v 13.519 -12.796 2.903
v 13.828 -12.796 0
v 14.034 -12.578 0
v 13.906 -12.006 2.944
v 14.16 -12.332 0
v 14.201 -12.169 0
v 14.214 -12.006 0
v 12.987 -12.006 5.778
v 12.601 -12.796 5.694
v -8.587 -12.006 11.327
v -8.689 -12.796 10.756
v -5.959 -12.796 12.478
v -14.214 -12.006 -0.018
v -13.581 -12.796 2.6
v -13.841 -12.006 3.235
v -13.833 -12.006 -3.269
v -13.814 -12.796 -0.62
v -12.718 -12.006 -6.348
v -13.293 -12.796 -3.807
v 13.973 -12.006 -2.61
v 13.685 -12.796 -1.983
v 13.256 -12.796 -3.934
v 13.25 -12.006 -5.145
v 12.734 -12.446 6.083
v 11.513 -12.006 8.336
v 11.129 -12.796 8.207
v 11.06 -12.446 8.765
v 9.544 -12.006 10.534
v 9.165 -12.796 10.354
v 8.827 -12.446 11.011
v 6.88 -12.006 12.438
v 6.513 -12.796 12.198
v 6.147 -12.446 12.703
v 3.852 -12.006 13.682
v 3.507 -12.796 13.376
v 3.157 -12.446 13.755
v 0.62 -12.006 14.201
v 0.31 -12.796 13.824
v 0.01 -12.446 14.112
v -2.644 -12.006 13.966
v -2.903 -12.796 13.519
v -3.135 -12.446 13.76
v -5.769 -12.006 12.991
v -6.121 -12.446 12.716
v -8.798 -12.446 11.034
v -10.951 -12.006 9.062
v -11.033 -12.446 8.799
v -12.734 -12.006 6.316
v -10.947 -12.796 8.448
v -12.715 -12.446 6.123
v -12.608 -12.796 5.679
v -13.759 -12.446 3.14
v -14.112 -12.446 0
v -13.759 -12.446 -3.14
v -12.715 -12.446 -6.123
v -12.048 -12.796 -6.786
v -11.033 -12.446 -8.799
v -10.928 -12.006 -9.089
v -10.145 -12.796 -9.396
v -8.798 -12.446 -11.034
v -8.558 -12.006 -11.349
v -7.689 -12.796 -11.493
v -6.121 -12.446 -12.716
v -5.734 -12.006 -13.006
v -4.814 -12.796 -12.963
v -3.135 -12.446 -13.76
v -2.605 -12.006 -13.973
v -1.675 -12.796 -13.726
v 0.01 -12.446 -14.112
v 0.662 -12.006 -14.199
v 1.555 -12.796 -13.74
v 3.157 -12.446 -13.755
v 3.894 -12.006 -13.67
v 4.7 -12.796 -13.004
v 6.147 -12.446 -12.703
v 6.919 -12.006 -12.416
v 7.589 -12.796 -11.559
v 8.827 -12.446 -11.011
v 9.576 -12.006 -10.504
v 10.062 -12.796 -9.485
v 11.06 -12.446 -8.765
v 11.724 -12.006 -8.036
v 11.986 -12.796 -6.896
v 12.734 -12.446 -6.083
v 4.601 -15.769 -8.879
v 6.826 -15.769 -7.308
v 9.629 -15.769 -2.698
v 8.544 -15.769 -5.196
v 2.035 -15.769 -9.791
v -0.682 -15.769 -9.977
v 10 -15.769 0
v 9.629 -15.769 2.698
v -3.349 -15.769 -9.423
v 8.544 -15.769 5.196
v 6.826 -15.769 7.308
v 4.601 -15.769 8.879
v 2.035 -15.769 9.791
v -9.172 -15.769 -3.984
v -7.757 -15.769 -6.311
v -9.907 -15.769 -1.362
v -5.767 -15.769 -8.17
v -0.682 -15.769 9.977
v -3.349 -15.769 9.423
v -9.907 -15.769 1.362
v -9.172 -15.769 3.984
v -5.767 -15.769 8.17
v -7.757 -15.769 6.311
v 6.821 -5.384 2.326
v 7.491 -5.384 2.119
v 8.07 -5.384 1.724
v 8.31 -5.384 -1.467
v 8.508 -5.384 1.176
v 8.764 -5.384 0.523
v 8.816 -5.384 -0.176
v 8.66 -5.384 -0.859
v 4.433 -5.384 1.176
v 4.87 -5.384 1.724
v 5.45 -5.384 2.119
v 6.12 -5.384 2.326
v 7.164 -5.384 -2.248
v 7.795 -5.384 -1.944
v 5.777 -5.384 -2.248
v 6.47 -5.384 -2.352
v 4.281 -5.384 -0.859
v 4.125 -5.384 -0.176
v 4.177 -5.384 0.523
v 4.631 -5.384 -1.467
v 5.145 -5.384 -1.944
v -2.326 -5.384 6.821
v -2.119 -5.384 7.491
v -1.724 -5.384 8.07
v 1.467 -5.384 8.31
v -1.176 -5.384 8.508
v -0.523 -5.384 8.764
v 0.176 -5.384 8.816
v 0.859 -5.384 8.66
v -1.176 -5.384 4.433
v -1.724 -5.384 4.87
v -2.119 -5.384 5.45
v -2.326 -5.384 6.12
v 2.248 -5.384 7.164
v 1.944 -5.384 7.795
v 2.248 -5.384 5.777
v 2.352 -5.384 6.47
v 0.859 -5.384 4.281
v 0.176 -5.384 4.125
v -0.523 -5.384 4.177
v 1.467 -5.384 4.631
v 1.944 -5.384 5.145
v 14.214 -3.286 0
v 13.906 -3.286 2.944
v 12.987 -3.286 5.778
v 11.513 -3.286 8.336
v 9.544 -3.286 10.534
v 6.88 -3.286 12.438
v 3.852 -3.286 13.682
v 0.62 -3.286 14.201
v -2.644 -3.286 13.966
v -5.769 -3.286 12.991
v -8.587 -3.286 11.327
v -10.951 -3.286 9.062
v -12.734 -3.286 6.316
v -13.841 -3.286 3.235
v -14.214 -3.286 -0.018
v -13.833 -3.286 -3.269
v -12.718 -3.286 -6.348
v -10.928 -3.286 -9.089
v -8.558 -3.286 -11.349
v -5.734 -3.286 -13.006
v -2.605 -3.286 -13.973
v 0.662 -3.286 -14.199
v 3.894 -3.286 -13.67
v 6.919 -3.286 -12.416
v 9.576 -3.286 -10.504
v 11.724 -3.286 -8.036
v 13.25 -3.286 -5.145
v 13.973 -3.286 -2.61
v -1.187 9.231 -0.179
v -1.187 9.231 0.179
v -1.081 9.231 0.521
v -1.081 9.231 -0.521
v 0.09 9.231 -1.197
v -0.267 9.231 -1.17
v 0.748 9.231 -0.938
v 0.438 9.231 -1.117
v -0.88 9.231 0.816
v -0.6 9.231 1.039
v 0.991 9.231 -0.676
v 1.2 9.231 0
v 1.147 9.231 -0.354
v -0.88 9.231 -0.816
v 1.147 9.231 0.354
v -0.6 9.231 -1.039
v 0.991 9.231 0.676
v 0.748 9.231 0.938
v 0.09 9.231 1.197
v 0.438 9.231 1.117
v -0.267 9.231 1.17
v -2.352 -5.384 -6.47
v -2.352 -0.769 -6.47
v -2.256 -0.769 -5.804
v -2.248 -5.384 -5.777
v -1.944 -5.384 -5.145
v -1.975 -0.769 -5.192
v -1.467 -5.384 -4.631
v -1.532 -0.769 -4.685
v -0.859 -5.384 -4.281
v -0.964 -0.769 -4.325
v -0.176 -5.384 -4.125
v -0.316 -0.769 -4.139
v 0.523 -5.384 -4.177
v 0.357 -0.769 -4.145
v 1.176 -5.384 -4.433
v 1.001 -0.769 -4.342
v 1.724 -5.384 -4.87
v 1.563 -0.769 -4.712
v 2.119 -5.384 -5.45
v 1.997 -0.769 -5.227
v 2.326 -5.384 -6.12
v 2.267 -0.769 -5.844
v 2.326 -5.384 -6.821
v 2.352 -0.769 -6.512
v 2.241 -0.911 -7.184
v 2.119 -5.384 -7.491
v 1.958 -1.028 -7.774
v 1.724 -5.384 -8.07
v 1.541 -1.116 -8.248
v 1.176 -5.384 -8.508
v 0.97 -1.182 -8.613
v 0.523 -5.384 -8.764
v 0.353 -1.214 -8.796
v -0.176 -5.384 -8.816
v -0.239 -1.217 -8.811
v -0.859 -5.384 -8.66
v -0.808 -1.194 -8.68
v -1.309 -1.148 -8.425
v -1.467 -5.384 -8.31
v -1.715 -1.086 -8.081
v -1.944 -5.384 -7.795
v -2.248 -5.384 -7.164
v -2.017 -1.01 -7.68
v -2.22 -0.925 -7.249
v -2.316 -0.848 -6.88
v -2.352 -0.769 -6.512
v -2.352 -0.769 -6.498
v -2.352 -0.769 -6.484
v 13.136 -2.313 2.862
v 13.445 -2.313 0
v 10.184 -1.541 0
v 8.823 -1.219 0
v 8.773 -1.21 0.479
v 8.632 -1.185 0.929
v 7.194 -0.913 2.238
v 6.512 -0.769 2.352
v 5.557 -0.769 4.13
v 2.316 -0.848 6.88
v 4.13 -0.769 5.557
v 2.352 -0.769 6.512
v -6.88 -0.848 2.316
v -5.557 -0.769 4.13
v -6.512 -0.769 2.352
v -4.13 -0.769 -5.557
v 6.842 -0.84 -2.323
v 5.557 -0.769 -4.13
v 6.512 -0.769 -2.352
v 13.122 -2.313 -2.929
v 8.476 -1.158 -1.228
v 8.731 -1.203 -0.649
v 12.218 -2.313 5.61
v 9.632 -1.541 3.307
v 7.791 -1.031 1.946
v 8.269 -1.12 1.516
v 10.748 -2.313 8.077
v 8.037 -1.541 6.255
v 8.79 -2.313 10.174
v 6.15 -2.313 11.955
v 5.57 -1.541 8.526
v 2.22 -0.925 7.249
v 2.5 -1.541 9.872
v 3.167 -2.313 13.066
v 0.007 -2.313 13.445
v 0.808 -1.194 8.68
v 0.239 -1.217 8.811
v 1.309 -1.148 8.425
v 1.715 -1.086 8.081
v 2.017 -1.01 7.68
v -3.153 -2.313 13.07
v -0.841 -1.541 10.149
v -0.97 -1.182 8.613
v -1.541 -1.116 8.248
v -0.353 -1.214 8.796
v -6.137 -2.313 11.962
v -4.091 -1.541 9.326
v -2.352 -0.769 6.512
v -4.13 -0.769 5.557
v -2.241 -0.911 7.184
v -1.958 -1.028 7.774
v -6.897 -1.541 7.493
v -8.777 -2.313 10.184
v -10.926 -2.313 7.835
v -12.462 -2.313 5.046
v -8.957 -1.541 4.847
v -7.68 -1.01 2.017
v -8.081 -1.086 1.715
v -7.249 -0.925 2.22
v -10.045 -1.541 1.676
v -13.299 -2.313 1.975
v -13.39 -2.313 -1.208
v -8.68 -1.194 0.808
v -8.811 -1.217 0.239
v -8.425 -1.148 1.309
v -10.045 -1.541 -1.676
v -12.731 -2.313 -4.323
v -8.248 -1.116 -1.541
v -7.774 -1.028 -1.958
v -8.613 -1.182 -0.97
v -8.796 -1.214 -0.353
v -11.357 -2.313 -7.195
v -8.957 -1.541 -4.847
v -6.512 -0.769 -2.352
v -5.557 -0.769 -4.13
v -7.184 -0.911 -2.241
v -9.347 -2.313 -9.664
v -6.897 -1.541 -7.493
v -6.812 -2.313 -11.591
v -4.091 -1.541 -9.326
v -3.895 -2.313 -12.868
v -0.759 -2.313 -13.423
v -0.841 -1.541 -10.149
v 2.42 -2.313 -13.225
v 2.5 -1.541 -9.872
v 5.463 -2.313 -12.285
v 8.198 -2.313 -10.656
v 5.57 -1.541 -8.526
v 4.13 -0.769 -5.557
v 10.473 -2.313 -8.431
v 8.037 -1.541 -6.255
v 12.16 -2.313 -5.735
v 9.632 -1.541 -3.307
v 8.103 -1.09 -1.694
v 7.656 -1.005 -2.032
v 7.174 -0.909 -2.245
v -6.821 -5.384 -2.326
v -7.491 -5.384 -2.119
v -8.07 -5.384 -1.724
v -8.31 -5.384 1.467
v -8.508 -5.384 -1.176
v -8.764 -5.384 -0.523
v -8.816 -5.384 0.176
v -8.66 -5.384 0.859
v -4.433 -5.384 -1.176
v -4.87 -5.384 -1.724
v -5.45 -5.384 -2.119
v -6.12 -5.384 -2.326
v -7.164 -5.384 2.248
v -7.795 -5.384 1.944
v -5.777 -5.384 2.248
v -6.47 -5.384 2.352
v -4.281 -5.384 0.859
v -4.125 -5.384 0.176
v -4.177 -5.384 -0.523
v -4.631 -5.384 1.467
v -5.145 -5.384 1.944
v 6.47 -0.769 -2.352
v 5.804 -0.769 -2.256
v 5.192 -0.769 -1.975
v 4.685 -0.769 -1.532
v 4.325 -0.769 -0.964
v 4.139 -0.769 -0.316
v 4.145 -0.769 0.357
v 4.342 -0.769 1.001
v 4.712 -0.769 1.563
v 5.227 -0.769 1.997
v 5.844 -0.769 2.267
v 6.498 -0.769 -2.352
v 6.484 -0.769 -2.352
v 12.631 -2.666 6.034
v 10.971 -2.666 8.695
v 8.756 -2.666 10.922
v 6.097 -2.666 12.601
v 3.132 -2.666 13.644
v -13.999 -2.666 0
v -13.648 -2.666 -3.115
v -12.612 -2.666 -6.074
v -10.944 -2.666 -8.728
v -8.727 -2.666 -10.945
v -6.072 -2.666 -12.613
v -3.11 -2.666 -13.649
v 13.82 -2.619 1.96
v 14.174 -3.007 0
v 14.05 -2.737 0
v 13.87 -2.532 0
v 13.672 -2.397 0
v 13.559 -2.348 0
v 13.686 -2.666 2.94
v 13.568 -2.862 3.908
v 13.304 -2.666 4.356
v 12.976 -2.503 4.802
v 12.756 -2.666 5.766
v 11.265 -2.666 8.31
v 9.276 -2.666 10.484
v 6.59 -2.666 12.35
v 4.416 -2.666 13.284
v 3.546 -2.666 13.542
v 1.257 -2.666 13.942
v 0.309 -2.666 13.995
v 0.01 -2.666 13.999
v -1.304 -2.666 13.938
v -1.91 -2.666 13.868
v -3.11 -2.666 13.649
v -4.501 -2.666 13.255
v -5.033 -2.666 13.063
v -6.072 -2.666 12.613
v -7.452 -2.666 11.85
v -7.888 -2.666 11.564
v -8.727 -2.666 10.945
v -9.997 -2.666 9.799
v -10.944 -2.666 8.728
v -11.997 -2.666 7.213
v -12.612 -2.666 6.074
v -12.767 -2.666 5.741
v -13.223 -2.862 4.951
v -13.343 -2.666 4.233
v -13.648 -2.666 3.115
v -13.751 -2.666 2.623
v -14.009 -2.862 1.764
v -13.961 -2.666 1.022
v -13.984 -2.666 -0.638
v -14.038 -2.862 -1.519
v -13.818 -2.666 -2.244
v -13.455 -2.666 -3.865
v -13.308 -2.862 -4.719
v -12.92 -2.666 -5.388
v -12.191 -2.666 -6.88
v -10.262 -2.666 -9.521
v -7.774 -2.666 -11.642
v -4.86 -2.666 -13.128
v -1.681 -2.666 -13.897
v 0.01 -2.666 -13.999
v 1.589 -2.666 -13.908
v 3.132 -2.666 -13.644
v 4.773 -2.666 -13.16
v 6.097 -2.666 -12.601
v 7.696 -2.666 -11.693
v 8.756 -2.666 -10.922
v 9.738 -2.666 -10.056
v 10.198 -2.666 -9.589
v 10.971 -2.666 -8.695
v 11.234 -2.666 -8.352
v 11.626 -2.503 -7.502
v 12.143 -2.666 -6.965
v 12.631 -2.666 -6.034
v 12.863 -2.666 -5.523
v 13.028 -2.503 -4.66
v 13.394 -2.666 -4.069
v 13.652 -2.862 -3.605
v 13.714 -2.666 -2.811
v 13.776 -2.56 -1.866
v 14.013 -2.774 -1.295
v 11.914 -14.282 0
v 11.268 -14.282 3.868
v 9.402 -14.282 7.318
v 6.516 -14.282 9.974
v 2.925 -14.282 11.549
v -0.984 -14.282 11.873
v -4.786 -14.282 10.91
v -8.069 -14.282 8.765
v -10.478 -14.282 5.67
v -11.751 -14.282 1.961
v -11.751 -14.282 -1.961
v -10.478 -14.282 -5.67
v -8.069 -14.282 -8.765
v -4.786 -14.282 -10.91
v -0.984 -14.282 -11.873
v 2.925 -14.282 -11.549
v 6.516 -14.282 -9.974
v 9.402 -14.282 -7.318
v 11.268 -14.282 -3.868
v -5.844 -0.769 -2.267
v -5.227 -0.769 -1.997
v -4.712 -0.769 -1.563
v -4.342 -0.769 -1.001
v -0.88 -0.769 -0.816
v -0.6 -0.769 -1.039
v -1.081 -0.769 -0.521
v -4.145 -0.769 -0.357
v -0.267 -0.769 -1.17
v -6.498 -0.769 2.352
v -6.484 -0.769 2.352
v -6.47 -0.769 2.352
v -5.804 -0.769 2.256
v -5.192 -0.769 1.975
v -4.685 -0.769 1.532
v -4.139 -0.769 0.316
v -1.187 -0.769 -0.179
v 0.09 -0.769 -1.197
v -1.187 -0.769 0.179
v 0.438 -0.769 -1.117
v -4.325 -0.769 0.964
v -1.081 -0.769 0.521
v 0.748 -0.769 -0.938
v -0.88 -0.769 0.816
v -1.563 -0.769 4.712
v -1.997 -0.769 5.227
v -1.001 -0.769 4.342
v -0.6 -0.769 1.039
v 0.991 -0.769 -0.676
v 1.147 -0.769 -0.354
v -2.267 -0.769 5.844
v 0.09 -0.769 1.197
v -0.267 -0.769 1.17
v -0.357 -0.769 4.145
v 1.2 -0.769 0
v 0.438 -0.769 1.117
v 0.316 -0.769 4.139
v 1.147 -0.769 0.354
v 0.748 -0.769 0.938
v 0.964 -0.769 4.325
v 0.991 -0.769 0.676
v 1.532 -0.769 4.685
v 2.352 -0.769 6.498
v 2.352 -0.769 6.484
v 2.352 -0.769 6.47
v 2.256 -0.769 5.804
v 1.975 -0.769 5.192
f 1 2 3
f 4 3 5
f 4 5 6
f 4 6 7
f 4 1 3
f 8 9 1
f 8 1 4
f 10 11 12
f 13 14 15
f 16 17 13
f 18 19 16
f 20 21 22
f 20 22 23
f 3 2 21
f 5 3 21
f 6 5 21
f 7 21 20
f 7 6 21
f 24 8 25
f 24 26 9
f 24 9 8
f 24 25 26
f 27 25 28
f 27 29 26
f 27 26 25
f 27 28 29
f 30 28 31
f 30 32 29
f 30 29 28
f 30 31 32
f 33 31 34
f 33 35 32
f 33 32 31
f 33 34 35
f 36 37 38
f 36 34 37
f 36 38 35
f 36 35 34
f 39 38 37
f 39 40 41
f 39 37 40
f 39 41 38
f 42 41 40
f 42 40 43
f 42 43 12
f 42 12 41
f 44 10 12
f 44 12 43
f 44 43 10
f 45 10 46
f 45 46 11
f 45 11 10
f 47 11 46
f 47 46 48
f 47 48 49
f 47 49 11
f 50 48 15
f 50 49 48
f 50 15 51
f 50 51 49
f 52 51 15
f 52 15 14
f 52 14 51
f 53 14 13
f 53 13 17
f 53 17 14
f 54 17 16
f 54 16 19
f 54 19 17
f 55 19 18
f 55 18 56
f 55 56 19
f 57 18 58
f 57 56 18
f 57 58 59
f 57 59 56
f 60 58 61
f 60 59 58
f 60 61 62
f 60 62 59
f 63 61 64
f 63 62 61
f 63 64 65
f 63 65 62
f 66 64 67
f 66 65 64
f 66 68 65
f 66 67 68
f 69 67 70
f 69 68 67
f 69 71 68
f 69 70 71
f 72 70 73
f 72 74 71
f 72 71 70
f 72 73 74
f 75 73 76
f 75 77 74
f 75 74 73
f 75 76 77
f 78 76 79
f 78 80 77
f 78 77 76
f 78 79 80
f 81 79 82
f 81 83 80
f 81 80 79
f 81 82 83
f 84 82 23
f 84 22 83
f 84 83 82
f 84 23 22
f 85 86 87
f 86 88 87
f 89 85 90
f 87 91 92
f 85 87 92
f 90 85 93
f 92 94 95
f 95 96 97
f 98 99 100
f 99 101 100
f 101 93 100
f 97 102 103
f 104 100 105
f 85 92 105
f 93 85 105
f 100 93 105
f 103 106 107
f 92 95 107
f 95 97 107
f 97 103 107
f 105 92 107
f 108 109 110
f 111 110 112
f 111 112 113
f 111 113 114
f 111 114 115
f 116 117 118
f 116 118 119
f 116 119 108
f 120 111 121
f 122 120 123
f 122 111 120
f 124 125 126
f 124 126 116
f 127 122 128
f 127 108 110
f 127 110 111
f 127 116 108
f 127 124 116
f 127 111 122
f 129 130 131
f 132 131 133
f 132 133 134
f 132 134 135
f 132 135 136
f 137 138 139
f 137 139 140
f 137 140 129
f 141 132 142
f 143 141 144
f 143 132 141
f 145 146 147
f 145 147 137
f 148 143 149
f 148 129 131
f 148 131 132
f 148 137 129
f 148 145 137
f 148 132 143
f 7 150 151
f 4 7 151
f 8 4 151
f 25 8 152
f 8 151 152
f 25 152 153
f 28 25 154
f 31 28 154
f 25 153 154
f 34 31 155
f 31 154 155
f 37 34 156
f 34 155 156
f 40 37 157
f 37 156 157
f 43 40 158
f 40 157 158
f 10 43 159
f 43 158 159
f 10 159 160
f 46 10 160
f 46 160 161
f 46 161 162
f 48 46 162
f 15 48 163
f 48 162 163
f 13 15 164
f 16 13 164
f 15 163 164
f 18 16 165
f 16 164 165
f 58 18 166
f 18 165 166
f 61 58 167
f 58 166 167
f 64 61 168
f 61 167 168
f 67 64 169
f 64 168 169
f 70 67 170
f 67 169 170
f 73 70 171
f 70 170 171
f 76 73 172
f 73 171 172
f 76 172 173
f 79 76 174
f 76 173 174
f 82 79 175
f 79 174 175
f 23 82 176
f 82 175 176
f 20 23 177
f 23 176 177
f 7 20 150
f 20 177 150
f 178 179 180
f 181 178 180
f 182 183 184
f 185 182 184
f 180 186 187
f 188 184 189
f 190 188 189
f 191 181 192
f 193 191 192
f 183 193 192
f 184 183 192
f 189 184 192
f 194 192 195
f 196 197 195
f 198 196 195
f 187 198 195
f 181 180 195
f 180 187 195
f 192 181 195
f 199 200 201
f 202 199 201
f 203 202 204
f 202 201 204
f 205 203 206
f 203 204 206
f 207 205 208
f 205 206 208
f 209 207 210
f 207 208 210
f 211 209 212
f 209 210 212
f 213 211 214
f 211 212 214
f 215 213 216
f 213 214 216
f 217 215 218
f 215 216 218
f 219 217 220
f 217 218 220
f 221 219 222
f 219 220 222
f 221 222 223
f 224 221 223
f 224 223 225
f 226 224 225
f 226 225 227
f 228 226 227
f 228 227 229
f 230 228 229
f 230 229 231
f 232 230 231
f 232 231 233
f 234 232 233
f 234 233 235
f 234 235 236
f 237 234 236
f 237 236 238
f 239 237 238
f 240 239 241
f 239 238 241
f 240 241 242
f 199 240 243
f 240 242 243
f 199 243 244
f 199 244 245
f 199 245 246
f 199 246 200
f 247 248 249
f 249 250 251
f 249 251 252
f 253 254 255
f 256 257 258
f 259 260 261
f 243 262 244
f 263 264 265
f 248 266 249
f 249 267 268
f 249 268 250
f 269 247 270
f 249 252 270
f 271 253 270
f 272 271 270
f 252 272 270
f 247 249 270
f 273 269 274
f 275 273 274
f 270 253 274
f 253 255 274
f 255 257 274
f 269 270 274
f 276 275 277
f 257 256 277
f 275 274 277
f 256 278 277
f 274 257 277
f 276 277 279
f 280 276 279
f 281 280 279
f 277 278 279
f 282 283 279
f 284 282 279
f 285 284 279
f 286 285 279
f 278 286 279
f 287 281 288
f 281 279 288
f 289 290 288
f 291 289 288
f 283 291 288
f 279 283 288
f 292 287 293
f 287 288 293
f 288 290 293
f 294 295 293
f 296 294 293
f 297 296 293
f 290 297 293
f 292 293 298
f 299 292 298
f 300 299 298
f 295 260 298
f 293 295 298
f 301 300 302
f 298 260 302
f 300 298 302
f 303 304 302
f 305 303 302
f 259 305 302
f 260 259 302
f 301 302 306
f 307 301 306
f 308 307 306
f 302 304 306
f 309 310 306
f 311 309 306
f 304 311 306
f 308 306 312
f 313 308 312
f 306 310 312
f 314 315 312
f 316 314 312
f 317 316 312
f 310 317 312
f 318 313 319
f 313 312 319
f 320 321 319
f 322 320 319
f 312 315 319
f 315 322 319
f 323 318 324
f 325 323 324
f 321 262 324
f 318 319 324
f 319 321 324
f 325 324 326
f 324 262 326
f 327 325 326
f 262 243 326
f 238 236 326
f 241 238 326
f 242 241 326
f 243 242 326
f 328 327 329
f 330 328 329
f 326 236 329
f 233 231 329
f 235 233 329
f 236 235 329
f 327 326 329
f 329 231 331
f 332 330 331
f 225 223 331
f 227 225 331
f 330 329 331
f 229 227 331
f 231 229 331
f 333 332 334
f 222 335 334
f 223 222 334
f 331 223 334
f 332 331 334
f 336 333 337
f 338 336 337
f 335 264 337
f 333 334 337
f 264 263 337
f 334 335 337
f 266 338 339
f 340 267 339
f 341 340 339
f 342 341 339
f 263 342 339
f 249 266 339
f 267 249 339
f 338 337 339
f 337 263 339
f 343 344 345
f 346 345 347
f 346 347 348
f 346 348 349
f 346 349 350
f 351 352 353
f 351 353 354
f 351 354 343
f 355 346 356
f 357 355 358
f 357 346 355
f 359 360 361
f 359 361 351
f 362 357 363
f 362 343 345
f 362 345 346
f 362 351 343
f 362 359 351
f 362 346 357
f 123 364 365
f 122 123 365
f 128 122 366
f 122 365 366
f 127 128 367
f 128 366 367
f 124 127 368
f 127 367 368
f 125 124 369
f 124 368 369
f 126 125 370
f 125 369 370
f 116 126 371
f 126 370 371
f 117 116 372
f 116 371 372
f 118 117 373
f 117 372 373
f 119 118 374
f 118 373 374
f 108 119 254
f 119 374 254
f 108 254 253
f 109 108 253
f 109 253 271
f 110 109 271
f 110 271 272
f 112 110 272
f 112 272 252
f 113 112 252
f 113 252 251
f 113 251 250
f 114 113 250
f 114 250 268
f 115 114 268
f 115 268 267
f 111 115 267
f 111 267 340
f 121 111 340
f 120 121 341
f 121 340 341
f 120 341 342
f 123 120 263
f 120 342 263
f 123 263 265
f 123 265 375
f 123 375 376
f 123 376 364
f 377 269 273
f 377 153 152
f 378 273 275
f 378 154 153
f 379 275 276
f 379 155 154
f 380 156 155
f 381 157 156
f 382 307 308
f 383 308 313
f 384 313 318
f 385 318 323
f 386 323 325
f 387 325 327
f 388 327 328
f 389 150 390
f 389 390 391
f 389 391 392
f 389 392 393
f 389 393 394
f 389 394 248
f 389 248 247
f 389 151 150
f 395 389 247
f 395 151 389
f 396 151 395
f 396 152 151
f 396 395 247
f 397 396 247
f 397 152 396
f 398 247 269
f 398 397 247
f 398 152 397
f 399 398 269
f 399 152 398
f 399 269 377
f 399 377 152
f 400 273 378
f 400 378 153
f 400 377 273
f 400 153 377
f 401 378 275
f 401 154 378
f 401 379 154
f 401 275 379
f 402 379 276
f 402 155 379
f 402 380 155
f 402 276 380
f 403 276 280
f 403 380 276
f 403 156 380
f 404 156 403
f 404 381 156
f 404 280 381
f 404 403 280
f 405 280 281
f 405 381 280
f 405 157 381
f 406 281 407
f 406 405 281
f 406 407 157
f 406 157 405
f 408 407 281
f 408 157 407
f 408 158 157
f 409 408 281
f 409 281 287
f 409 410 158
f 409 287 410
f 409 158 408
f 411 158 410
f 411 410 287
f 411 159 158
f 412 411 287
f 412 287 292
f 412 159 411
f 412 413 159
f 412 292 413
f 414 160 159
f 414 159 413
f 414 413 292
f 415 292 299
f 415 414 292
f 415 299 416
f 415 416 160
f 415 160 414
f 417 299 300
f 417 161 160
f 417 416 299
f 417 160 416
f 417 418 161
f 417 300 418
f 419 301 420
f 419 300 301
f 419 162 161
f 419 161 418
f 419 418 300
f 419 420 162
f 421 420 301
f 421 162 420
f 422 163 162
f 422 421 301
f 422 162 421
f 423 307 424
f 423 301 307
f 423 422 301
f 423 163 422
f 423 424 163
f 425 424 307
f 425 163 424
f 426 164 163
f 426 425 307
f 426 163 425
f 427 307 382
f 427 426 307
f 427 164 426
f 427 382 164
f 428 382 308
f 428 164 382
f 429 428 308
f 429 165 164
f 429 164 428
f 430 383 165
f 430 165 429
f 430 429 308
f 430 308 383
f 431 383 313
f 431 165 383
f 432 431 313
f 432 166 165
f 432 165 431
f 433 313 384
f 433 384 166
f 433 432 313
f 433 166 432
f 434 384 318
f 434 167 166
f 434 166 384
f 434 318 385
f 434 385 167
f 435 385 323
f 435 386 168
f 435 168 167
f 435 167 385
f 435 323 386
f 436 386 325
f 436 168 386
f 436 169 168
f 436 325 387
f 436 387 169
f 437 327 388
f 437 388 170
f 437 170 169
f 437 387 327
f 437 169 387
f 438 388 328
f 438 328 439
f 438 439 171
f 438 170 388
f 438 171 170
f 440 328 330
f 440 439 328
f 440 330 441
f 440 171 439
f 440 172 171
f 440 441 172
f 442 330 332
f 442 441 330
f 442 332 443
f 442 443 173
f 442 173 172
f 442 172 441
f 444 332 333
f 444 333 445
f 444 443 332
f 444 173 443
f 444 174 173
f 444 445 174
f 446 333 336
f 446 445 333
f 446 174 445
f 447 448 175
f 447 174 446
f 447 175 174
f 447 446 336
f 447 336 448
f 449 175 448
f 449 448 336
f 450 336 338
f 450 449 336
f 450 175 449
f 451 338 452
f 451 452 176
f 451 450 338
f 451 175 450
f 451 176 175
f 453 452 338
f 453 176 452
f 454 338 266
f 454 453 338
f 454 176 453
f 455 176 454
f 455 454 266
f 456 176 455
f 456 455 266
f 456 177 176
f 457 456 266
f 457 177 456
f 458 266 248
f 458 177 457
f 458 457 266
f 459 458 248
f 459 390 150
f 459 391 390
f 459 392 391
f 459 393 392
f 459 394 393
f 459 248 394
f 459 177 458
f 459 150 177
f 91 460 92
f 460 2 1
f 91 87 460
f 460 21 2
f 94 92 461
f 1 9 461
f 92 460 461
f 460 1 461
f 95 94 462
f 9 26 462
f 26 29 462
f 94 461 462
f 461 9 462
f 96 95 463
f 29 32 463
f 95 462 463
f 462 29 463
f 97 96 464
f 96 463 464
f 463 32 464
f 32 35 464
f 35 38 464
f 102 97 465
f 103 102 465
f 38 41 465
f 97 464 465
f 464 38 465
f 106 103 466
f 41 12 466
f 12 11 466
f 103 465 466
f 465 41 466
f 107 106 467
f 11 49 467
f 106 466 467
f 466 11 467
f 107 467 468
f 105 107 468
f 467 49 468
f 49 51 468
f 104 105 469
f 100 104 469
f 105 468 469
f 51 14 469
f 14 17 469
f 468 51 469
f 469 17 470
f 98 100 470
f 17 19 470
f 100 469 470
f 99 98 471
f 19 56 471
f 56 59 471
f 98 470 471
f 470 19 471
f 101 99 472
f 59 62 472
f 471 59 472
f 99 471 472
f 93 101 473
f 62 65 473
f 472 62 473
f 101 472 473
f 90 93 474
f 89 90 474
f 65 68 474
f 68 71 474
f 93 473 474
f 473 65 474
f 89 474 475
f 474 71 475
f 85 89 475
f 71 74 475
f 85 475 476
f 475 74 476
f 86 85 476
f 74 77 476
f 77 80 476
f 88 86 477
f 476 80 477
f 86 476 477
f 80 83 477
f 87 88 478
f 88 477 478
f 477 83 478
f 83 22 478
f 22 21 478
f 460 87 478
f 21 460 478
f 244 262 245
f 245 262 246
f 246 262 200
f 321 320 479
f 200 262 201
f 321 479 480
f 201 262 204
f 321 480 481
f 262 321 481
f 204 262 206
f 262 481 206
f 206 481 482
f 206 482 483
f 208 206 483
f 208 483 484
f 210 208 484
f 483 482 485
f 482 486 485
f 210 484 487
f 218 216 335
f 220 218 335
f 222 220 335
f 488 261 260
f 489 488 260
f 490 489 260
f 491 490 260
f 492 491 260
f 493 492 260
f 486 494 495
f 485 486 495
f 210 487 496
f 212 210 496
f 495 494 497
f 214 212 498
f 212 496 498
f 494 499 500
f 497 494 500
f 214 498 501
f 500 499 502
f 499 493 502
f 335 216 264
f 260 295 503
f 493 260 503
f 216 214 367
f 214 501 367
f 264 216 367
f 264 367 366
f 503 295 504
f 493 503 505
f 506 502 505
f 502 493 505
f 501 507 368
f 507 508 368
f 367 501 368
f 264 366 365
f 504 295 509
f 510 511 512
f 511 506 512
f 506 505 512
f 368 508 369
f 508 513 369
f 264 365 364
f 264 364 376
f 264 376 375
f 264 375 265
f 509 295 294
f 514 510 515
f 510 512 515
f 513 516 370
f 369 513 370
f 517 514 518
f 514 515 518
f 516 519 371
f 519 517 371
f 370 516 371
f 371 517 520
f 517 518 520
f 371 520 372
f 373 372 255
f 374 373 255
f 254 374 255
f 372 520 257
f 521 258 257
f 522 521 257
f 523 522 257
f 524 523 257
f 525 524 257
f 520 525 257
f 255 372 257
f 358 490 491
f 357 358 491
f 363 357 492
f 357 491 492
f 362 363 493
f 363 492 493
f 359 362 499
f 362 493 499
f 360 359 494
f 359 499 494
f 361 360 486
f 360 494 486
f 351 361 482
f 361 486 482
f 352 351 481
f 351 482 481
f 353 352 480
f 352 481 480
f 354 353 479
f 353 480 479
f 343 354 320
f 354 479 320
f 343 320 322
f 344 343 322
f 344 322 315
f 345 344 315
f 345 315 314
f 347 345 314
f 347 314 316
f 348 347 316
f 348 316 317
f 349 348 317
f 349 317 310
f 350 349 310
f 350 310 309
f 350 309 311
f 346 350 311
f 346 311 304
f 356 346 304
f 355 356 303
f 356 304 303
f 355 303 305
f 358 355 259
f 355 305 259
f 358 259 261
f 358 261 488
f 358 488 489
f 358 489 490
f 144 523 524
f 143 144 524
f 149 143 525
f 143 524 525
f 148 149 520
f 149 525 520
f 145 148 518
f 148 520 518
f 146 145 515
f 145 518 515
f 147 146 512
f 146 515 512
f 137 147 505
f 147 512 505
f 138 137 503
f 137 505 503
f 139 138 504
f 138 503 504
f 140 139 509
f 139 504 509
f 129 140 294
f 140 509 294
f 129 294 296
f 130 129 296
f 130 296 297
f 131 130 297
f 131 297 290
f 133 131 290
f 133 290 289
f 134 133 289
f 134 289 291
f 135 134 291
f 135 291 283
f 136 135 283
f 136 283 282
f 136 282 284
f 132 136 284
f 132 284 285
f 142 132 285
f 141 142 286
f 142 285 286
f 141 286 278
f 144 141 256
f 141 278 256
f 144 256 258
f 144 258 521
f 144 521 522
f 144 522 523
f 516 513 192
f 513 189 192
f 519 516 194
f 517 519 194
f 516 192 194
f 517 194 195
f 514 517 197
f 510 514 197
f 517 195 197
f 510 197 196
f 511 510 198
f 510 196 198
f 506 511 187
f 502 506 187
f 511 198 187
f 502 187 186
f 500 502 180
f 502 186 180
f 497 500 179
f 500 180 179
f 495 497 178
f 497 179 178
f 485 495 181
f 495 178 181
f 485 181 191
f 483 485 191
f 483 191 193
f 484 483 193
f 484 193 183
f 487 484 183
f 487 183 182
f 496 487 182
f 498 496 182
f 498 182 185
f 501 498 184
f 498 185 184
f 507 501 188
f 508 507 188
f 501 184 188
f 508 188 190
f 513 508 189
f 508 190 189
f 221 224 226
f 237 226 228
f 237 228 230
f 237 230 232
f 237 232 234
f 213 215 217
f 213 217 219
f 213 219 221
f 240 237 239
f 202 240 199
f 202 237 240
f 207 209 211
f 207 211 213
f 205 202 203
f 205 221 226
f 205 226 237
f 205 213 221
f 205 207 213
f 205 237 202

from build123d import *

# Parameters (mm, degrees)
SKETCH3_R          = 2.352290117
CUT_EXTRUDE1_DEPTH = 10
CIRPATTERN1_COUNT  = 4
FILLET1_R          = 1


with BuildPart() as part:
    # Sketch2 → Revolve1 (revolve)
    with BuildSketch(Plane.XY):
        Polygon((0, 9.231240755), (0, -15.768759245), (10, -15.768759245), (14.214231209, -12.495683607), (14.214231209, -2.495683607), (6.923362893, -0.768759245), (1.2, -0.768759245), (1.2, 9.231240755), align=None)
    revolve(axis=Axis((0, 9.231240755, 0), (0, -1, 0)))

    # Sketch3 → Cut-Extrude1 (cut)
    with BuildSketch(Plane(origin=(0, 4.615620377, 0), x_dir=(1, 0, 0), z_dir=(0, 1, 0))):
        with Locations((0, -6.470406052)):
            Circle(SKETCH3_R)
    cut_extrude1 = extrude(amount=-CUT_EXTRUDE1_DEPTH, mode=Mode.SUBTRACT)

    # CirPattern1: Cut-Extrude1 ×4 about axis
    cirpattern1_axis = Axis((0, 0, 0), (0, 1, 0))
    for i in range(1, CIRPATTERN1_COUNT):
        add(cut_extrude1.rotate(cirpattern1_axis, i * 360 / CIRPATTERN1_COUNT), mode=Mode.SUBTRACT)

    # Fillet1
    fillet1_edges = [part.edges().sort_by_distance(p)[0] for p in [
        (-14.214231209, -2.495683607, 0),
        (-14.214231209, -12.495683607, 0),
    ]]
    fillet(fillet1_edges, radius=FILLET1_R)


solid = part.part
